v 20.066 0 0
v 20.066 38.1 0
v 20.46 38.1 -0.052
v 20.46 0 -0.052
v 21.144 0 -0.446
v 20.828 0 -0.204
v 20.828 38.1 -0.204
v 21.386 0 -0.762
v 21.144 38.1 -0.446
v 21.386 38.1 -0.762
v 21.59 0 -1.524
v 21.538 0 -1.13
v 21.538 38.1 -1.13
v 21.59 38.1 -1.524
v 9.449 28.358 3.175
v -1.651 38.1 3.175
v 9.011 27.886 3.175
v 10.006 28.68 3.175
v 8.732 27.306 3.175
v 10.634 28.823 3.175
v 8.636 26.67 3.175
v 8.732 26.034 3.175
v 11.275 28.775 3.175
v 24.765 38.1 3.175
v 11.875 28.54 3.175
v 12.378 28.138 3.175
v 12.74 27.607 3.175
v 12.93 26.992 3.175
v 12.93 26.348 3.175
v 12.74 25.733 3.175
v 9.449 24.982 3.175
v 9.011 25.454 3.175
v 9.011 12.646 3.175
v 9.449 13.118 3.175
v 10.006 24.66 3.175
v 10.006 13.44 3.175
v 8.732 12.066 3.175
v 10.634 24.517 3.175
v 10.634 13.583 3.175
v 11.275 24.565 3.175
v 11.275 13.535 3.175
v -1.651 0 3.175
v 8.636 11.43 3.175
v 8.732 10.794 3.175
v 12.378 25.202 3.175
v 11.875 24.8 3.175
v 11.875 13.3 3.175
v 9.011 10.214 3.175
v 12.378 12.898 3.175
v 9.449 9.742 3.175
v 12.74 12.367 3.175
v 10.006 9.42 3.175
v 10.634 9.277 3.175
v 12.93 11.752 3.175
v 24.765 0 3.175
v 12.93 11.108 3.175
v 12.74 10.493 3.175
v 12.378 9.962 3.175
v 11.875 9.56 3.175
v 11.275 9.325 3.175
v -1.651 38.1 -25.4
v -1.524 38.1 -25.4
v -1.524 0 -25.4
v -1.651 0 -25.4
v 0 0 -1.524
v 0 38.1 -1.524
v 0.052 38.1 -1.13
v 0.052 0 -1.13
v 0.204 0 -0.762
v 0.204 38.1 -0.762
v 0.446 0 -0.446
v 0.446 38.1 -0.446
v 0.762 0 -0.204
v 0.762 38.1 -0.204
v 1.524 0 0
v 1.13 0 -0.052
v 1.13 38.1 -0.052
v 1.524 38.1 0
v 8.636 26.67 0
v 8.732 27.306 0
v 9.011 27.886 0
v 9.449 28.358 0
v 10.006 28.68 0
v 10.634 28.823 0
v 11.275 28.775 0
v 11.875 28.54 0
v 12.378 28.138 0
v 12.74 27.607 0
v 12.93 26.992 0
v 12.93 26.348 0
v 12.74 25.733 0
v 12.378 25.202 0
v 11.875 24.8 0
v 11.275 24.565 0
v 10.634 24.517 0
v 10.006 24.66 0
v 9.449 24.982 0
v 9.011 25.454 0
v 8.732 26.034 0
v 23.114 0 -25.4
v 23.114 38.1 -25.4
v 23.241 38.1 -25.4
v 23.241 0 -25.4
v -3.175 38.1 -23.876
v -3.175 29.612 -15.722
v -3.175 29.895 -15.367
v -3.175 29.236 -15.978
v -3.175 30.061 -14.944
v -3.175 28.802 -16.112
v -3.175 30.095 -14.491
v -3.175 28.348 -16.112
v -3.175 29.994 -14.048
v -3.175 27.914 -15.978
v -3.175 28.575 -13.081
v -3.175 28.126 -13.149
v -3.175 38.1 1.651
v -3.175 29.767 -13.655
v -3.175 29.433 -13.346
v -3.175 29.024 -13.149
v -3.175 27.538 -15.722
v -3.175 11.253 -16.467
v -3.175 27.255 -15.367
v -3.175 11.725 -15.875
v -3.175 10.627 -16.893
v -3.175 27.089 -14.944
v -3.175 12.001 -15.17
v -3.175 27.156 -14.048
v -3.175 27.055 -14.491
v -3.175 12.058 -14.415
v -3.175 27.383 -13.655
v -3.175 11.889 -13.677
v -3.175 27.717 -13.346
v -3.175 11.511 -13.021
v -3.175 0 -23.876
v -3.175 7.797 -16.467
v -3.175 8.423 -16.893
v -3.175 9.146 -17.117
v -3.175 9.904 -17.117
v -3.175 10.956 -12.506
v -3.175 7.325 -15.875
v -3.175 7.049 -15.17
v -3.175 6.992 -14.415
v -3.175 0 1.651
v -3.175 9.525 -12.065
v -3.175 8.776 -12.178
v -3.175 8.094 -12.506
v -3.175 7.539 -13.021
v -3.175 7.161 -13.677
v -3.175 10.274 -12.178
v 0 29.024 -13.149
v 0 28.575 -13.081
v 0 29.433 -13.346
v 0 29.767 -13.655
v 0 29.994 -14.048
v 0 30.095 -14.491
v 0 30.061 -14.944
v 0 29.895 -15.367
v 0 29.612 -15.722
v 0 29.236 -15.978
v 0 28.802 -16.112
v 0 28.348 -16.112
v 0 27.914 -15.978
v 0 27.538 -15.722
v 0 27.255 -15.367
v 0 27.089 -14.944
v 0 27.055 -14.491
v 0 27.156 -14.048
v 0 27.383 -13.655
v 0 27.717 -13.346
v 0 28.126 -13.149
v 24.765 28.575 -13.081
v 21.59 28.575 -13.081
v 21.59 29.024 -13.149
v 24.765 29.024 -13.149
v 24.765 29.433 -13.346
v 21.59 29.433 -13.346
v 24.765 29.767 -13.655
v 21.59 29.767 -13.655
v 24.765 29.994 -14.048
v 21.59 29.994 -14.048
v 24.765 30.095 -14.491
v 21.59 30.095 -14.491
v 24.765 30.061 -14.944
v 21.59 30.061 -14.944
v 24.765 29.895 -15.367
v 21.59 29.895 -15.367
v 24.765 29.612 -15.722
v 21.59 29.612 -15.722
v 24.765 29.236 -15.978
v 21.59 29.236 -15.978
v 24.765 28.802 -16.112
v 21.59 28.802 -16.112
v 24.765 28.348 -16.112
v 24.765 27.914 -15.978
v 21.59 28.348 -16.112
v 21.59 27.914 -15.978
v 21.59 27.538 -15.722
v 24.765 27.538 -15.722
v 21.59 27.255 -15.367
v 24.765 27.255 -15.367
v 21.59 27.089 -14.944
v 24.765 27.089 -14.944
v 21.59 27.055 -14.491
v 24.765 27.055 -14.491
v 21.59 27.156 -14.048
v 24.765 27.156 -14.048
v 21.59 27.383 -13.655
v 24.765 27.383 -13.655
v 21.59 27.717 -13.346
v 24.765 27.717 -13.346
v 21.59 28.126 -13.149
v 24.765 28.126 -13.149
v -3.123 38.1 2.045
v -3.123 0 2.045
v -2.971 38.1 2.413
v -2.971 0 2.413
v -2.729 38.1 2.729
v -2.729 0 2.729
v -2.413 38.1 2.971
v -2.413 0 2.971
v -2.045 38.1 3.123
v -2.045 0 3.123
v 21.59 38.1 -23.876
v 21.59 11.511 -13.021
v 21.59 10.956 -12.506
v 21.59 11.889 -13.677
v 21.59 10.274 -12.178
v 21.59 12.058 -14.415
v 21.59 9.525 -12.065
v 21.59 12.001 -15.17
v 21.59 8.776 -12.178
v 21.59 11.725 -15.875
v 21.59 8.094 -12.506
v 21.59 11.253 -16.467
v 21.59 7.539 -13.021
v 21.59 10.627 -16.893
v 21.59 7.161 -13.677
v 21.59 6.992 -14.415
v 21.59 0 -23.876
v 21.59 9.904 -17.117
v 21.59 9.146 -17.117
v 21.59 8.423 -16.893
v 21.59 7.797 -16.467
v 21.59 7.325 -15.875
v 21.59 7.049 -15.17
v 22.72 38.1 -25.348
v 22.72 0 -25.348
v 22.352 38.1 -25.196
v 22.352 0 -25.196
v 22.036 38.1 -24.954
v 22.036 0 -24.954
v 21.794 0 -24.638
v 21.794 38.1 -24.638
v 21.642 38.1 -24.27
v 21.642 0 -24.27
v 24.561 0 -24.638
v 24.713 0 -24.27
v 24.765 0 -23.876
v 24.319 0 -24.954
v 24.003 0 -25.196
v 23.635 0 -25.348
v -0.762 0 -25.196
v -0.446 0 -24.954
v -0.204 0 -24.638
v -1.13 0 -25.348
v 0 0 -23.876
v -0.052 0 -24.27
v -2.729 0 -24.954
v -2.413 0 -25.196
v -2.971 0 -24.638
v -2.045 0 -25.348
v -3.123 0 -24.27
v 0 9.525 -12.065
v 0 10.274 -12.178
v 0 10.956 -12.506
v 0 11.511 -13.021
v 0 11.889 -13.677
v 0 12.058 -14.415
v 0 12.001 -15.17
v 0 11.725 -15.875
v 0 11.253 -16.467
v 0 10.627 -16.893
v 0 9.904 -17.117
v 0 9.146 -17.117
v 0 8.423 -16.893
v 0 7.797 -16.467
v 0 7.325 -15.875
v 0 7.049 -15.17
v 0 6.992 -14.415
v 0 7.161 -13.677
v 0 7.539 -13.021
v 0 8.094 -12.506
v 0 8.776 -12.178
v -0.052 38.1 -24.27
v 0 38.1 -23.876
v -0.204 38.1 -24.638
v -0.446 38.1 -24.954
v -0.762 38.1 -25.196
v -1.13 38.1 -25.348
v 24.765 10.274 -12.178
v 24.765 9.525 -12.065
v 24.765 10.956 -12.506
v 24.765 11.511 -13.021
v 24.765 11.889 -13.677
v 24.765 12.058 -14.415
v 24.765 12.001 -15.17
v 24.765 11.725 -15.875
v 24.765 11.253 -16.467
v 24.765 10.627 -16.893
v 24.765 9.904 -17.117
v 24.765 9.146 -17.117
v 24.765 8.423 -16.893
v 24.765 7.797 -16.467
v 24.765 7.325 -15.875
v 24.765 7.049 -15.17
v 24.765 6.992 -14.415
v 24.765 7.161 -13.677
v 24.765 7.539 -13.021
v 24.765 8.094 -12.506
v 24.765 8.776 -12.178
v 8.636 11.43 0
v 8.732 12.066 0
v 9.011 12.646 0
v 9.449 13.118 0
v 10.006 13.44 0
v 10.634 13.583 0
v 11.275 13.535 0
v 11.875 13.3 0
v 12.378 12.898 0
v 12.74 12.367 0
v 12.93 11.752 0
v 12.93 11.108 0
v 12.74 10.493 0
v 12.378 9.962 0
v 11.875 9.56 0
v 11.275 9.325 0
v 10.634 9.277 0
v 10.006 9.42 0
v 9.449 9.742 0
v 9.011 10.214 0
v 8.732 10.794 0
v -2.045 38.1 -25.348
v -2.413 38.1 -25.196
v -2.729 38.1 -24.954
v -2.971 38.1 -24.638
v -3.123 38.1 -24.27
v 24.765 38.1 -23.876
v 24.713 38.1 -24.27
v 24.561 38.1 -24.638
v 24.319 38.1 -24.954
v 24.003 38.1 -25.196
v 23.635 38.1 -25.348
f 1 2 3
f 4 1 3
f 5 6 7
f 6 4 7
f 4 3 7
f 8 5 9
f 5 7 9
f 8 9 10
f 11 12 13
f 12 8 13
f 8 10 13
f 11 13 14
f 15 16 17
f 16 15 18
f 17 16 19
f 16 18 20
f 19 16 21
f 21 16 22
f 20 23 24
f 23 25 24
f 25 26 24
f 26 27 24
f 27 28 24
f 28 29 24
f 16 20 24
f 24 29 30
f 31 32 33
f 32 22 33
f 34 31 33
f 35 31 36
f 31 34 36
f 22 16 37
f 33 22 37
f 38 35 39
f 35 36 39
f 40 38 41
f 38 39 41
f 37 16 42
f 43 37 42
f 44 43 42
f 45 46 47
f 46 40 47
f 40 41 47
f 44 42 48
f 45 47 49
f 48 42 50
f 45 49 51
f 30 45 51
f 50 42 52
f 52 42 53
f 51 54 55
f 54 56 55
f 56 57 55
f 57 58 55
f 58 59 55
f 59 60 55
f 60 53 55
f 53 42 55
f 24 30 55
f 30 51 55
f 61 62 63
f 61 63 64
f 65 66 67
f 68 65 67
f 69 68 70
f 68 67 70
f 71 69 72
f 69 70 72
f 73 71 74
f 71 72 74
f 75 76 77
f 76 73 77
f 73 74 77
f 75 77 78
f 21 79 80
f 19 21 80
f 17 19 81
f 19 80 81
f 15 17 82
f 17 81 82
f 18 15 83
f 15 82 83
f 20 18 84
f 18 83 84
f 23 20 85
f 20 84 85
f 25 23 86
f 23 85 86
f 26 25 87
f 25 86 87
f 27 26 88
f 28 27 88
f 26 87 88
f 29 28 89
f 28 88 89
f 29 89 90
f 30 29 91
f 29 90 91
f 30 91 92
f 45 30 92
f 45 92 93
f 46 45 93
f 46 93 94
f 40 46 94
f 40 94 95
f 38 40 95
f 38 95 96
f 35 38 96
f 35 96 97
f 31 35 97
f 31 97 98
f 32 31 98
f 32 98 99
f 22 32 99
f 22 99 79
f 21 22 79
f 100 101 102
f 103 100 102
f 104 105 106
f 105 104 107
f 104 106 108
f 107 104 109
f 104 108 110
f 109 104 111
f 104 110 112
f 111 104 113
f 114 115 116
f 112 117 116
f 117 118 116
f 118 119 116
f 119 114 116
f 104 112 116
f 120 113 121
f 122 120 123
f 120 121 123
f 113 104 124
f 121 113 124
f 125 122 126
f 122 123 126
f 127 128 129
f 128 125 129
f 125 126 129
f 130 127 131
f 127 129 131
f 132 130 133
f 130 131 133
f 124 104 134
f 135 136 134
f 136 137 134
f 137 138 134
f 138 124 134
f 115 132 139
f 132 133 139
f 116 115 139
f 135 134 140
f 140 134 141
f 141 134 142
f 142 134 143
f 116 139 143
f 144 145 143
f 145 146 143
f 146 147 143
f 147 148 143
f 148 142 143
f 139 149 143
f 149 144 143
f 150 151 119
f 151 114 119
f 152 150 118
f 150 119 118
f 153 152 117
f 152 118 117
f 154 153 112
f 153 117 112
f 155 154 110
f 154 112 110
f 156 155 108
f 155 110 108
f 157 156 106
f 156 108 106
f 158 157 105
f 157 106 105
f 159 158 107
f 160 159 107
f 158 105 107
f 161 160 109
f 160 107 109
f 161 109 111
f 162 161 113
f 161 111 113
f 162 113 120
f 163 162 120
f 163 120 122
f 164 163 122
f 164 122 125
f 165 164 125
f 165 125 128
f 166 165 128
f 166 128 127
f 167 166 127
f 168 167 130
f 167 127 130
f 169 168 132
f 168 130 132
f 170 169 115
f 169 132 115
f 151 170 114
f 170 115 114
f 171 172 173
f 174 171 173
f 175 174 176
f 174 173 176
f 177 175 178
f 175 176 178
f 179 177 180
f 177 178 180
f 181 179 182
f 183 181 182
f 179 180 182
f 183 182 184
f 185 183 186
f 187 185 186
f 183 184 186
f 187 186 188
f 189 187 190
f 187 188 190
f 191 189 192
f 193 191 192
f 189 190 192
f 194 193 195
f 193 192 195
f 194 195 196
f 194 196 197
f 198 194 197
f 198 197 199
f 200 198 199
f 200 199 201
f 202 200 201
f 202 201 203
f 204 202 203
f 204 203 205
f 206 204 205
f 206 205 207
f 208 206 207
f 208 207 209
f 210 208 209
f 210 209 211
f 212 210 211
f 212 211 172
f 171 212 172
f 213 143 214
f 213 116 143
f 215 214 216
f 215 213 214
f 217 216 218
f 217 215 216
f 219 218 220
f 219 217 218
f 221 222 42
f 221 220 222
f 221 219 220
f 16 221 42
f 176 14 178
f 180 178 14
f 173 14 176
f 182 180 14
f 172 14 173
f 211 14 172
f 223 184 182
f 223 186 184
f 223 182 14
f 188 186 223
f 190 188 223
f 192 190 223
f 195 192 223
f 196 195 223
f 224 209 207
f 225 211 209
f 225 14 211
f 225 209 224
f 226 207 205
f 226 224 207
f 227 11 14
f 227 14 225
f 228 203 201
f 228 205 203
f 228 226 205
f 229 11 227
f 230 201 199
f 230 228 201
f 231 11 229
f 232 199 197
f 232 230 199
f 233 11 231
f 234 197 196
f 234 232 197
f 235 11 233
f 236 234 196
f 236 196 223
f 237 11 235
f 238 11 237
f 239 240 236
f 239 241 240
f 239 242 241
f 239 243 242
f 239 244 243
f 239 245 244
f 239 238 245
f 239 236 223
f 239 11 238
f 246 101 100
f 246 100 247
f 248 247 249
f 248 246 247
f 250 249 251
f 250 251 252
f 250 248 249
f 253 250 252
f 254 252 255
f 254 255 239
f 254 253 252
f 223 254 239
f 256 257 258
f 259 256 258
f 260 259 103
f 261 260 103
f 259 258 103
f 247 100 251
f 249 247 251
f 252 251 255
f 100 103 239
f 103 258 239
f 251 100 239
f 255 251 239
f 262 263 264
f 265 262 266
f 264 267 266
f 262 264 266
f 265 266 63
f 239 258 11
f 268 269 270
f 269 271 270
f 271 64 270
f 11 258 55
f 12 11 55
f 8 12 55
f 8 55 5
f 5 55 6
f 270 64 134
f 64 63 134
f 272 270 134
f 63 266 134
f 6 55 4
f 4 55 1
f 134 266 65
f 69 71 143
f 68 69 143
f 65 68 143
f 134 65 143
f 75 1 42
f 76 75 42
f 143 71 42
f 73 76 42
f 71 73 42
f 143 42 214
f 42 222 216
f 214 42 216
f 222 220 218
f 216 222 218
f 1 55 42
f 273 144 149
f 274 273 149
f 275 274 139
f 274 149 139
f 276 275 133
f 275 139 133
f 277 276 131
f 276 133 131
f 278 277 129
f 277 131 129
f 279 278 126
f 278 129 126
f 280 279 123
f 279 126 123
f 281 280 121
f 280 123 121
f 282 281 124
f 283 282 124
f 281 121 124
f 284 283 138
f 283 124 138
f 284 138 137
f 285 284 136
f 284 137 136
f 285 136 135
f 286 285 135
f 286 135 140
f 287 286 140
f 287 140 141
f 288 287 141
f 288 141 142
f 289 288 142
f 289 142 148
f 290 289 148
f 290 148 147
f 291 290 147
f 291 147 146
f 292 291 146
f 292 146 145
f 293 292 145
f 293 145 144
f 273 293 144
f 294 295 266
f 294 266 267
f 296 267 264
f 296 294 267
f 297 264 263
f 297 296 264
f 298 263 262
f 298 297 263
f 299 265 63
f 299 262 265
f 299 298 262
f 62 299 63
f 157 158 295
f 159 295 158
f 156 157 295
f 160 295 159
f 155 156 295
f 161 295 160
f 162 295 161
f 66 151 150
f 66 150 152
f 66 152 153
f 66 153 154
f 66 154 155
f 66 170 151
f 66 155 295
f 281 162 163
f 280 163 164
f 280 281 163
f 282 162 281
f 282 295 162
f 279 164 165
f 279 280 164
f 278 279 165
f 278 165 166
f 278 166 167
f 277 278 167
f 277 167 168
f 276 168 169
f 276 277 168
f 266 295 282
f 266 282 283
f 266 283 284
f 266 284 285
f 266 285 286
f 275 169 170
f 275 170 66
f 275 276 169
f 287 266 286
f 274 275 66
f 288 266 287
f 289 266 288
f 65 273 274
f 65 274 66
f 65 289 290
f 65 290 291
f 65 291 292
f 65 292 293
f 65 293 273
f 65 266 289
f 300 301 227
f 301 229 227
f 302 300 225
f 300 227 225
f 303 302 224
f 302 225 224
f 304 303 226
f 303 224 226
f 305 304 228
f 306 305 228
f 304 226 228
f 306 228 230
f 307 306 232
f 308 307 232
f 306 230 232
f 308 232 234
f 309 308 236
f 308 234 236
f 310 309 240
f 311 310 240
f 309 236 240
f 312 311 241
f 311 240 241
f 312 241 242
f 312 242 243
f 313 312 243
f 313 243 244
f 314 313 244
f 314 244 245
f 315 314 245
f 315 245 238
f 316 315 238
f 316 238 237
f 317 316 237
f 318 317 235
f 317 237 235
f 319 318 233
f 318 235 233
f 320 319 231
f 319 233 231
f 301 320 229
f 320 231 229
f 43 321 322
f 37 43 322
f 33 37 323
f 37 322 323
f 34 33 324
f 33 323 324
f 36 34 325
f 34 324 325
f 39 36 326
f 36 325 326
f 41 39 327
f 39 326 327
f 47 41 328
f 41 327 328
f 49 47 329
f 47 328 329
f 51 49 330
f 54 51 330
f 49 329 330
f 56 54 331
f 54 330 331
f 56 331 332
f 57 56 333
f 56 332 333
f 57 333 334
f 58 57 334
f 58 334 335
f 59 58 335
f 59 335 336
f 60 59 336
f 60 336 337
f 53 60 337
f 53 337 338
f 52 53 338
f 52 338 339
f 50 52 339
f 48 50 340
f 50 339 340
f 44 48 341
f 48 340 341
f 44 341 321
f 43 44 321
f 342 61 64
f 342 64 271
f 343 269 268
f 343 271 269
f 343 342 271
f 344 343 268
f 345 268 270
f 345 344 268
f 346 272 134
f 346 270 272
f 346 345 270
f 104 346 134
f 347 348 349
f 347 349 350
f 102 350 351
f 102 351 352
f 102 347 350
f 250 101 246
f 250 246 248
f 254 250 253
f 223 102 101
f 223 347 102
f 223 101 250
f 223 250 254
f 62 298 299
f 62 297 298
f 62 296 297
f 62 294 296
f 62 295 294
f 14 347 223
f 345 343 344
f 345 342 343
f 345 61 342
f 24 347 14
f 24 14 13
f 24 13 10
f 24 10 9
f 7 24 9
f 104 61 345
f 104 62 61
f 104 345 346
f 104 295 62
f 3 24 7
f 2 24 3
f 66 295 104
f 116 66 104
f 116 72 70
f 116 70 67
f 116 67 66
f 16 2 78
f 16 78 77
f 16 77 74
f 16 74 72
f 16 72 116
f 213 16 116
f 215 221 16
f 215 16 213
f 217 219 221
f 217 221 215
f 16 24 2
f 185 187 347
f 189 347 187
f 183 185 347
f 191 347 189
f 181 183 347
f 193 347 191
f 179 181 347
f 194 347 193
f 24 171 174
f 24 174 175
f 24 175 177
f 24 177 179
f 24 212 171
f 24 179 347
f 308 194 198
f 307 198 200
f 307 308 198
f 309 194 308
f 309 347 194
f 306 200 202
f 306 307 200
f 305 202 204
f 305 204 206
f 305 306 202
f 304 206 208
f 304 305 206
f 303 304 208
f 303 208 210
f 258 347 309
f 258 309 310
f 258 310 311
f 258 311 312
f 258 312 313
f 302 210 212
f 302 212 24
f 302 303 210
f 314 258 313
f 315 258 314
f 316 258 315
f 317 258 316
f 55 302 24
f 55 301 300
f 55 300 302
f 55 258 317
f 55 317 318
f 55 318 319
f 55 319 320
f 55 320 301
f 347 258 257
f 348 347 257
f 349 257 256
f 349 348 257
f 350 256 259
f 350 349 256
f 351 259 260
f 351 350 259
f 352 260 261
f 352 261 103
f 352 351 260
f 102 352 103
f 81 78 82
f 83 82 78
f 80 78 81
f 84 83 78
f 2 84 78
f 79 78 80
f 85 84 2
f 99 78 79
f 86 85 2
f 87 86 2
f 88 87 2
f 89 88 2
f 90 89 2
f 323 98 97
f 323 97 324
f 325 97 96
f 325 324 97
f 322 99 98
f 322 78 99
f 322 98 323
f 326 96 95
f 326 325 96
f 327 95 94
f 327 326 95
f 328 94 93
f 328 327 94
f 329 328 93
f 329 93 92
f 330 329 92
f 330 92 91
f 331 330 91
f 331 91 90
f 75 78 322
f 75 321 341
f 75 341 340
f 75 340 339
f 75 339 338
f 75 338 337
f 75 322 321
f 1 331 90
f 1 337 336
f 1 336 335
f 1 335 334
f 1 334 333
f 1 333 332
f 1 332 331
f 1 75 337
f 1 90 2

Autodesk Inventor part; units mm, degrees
ref_plane "YZ Plane" through (0, 0, 0) normal (1, 0, 0) x (0, 1, 0)
ref_plane "XZ Plane" through (0, 0, 0) normal (0, 1, 0) x (-1, 0, 0)
ref_plane "XY Plane" through (0, 0, 0) normal (0, 0, 1) x (1, 0, 0)
sketch "Sketch1" plane through (0, 0, 0) normal (0, 1, 0) x (-1, 0, 0)
  line L0 (0, 0) -> (-21.59, 0)
  line L1 (-21.59, 0) -> (-21.59, -25.4)
  line L2 (-21.59, -25.4) -> (0, -25.4)
  line L3 (0, -25.4) -> (0, 0)
  line L4 (0, -25.4) -> (3.175, -25.4)
  line L5 (3.175, -25.4) -> (3.175, 3.175)
  line L6 (3.175, 3.175) -> (0, 3.175)
  line L7 (0, 3.175) -> (0, -25.4)
  line L8 (-21.59, -25.4) -> (-24.765, -25.4)
  line L9 (-24.765, -25.4) -> (-24.765, 3.175)
  line L10 (-24.765, 3.175) -> (-21.59, 3.175)
  line L11 (-21.59, 3.175) -> (-21.59, -25.4)
  line L12 (-21.59, 3.175) -> (0, 3.175)
  line L13 (0, 3.175) -> (0, 0)
  line L14 (0, 0) -> (-21.59, 0)
  line L15 (-21.59, 0) -> (-21.59, 3.175)
  dimension "d0" = 21.59
  dimension "d1" = 25.4
  dimension "d2" = 3.175
  dimension "d3" = 28.575
  dimension "d4" = 3.175
extrude "Extrusion1" add sketch "Sketch1" along normal blind 38.1 contours L7 L6 L5 L4 L3 | L0 L11 L12 L7 | L1 L8 L9 L10 L11
sketch "Sketch2" plane through (21.59, 0, 0) normal (0, 0, -1) x (-1, 0, 0)
  line L0 (24.765, 38.1) -> (-3.175, 38.1) projected
  line L1 (10.795, 38.1) -> (10.795, 26.67)
  line L2 (10.795, 38.1) -> (22.225, 38.1) construction
  line L3 (24.765, 0) -> (-3.175, 0) projected
  line L4 (10.795, 0) -> (10.795, 11.43)
  line L5 (10.795, 0) -> (22.225, 0) construction
  circle A0 centre (10.795, 26.67) radius 2.159
  circle A1 centre (10.795, 11.43) radius 2.159
  point P0 (21.59, 0)
  dimension "d7" = 11.43
  dimension "d8" = 90
  dimension "d9" = 11.43
  dimension "d10" = 90
  dimension "d11" = 4.318
  dimension "d12" = 4.318
sketch "Sketch3" plane through (-3.175, 0, -25.4) normal (-1, 0, 0) x (0, 0, 1)
  line L0 (28.575, 38.1) -> (0, 38.1) projected
  line L1 (0, 38.1) -> (10.795, 38.1)
  line L2 (10.795, 38.1) -> (10.795, 28.575)
  line L3 (28.575, 0) -> (0, 0) projected
  line L4 (10.795, 0) -> (10.795, 9.525)
  line L5 (10.795, 0) -> (20.32, 0) construction
  circle A0 centre (10.795, 28.575) radius 1.524
  circle A1 centre (10.795, 9.525) radius 2.54
  point P0 (25.4, 0)
  dimension "d13" = 10.795
  dimension "d14" = 9.525
  dimension "d15" = 90
  dimension "d16" = 9.525
  dimension "d17" = 90
  dimension "d18" = 3.048
  dimension "d19" = 5.08
extrude "Extrusion2" cut sketch "Sketch2" against normal blind 38.1
extrude "Extrusion3" cut sketch "Sketch3" against normal blind 38.1
fillet "Fillet1" radius 1.524 7 edges at (-3.175, 19.05, 3.175) (0, 19.05, 0) (24.765, 19.05, -25.4) (21.59, 19.05, -25.4) (21.59, 19.05, 0) (0, 19.05, -25.4) (-3.175, 19.05, -25.4)
properties part number "Long Robotics Mount V2"
